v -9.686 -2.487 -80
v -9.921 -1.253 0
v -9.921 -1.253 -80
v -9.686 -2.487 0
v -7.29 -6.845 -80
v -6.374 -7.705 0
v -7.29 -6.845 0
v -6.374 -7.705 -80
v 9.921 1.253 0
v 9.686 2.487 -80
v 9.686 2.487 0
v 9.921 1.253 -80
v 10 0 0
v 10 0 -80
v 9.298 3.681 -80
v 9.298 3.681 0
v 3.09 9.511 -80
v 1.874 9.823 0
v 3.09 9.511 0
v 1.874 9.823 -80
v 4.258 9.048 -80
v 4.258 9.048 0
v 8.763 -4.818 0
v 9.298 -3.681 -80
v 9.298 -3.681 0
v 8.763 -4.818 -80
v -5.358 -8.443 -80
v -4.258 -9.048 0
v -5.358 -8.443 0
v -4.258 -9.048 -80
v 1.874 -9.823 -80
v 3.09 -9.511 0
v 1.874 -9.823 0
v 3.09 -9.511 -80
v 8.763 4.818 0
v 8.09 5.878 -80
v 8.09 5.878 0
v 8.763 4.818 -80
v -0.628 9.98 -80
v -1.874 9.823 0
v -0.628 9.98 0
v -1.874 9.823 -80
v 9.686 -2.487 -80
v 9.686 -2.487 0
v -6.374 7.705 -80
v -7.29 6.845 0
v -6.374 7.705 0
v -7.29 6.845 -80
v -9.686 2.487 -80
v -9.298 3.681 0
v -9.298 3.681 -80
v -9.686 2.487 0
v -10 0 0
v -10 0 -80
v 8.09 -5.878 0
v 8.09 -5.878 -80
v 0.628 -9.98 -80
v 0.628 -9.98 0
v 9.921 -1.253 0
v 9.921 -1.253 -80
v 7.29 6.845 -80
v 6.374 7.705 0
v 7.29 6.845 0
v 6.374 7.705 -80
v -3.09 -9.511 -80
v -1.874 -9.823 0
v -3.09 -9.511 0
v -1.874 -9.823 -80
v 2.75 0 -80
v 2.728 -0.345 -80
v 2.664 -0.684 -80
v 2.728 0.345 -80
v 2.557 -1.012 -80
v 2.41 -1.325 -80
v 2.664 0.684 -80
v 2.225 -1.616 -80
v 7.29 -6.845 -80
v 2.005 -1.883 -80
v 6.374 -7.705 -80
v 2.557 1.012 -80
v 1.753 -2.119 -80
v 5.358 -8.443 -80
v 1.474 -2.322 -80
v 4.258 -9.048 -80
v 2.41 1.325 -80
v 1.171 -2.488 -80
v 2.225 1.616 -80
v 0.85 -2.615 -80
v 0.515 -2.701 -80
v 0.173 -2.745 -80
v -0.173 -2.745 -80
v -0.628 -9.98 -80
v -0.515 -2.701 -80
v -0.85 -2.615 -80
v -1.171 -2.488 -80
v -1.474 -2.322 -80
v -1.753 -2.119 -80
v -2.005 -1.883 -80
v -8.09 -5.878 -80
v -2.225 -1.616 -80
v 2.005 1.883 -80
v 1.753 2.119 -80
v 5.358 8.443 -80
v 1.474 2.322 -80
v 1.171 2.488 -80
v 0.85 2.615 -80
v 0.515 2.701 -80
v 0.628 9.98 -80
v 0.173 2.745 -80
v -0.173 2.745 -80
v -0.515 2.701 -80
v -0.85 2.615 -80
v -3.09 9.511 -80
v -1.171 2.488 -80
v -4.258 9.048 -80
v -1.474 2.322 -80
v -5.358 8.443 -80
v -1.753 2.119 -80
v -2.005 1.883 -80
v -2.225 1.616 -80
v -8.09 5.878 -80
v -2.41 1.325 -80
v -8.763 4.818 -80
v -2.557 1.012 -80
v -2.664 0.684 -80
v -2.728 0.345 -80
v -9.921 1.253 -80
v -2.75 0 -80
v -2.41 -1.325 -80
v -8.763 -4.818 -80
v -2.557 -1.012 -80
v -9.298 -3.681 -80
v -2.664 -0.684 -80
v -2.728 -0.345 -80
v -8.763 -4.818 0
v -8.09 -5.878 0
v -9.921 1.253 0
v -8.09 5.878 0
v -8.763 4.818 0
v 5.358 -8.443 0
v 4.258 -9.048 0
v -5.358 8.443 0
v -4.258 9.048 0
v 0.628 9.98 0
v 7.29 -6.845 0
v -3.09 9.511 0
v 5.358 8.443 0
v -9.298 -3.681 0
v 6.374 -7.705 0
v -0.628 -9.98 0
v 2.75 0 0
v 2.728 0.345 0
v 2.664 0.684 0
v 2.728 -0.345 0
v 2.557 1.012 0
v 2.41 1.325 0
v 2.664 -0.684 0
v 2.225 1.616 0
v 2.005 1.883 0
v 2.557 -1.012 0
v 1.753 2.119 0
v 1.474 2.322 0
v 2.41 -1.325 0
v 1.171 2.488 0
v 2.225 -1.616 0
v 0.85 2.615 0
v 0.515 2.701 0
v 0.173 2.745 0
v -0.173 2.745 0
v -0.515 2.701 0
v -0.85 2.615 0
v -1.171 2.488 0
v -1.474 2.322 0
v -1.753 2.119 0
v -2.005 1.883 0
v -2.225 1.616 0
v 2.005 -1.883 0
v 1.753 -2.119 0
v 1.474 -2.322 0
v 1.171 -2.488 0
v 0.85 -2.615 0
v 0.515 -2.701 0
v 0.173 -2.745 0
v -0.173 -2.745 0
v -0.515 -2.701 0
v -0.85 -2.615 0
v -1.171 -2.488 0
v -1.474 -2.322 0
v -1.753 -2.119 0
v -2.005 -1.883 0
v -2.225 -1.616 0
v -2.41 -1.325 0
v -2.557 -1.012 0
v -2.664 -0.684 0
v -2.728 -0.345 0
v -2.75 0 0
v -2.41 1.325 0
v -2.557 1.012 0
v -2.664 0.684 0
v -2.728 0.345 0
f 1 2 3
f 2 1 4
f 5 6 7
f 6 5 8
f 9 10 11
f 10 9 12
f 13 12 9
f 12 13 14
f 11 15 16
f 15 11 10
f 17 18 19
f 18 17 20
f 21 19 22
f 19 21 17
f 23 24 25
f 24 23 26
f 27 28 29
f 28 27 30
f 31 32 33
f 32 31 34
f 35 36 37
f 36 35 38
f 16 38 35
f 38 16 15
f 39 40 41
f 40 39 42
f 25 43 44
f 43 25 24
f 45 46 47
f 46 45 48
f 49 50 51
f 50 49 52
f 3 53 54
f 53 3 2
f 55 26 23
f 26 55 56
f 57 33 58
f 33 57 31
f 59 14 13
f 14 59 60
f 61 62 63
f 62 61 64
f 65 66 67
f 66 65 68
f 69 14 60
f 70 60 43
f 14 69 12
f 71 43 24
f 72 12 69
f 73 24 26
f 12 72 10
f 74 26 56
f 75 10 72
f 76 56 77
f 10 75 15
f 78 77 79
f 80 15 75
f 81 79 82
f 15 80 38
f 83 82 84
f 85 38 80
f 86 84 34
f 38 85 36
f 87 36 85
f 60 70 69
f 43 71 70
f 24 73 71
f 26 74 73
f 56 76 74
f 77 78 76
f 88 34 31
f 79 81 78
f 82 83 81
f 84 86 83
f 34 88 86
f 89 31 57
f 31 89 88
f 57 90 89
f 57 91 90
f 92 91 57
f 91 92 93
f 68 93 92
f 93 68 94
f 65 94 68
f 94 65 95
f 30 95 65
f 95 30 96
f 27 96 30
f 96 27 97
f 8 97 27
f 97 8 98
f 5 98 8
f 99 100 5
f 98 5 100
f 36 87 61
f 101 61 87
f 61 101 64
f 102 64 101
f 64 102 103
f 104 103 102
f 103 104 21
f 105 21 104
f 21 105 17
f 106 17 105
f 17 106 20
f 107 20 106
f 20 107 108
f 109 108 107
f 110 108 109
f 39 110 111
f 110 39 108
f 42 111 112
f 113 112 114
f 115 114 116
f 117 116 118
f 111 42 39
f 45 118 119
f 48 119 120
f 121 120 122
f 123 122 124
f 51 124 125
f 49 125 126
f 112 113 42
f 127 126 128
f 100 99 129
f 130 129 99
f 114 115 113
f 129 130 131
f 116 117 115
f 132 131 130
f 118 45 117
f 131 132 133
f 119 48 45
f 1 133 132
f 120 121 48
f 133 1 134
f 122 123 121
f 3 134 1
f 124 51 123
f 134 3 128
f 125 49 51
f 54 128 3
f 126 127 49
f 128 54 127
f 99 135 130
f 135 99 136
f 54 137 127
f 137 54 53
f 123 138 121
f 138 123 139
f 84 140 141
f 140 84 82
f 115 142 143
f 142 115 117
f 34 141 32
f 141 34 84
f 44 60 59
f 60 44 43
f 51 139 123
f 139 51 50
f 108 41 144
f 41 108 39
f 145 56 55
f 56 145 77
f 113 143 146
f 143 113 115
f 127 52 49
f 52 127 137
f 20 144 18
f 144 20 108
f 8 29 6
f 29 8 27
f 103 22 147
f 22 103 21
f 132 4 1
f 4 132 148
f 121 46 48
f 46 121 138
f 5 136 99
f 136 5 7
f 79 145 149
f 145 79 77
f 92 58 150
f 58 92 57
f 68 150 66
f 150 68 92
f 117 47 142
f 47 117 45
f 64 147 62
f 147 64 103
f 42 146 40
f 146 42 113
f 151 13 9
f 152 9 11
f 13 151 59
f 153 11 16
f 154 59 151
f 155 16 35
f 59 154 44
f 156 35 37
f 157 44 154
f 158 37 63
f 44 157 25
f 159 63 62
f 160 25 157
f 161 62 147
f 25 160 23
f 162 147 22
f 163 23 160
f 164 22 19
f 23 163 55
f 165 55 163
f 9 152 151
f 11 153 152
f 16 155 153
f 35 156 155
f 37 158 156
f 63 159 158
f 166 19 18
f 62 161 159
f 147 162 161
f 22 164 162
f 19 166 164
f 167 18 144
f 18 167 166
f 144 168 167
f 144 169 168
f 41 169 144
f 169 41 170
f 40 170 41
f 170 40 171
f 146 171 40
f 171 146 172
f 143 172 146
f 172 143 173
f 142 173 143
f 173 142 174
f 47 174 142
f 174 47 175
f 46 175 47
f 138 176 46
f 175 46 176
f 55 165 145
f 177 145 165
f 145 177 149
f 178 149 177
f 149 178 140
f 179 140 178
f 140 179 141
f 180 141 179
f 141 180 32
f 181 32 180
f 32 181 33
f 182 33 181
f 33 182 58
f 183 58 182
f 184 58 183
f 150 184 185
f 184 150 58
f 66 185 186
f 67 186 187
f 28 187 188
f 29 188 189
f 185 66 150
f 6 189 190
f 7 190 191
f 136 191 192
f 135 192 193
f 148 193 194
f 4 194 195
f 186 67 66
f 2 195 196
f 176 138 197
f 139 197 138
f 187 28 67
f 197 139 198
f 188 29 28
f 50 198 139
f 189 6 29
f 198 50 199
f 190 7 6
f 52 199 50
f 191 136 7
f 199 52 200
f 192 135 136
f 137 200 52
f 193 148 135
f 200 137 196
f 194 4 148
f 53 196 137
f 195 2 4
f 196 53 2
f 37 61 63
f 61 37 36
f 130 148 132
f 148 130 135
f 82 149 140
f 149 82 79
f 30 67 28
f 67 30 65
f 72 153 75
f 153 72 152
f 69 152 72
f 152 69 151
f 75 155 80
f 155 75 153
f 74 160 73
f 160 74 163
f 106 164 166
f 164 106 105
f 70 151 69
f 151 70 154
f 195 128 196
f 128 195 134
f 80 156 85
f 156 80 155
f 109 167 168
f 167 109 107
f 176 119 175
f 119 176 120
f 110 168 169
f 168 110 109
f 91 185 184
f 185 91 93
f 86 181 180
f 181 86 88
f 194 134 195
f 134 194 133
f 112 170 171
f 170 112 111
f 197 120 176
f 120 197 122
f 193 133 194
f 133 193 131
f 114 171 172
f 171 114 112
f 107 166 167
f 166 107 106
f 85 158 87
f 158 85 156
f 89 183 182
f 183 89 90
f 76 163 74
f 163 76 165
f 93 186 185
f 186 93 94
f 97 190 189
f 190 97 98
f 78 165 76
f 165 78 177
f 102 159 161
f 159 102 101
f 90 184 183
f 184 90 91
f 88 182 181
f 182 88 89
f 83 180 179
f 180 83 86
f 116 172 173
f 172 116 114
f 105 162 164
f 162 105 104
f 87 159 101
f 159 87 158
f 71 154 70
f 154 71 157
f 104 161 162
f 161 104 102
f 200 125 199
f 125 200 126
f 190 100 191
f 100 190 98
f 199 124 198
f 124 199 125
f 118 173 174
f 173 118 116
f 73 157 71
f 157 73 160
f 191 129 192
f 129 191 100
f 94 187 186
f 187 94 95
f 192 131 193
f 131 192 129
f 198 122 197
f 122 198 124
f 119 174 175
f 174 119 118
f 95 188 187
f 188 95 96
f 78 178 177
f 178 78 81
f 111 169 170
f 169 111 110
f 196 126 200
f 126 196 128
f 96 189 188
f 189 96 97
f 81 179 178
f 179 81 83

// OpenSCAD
$fn = 50;


difference() {
	union() {
		translate(v = [0, 0, -80.0000000000]) {
			cylinder(h = 80, r = 10.0000000000);
		}
		cylinder(h = 0, r = 16.0000000000);
	}
	union() {
		#translate(v = [0, 0, -80]) {
			cylinder(h = 80, r = 2.7500000000);
		}
	}
}
